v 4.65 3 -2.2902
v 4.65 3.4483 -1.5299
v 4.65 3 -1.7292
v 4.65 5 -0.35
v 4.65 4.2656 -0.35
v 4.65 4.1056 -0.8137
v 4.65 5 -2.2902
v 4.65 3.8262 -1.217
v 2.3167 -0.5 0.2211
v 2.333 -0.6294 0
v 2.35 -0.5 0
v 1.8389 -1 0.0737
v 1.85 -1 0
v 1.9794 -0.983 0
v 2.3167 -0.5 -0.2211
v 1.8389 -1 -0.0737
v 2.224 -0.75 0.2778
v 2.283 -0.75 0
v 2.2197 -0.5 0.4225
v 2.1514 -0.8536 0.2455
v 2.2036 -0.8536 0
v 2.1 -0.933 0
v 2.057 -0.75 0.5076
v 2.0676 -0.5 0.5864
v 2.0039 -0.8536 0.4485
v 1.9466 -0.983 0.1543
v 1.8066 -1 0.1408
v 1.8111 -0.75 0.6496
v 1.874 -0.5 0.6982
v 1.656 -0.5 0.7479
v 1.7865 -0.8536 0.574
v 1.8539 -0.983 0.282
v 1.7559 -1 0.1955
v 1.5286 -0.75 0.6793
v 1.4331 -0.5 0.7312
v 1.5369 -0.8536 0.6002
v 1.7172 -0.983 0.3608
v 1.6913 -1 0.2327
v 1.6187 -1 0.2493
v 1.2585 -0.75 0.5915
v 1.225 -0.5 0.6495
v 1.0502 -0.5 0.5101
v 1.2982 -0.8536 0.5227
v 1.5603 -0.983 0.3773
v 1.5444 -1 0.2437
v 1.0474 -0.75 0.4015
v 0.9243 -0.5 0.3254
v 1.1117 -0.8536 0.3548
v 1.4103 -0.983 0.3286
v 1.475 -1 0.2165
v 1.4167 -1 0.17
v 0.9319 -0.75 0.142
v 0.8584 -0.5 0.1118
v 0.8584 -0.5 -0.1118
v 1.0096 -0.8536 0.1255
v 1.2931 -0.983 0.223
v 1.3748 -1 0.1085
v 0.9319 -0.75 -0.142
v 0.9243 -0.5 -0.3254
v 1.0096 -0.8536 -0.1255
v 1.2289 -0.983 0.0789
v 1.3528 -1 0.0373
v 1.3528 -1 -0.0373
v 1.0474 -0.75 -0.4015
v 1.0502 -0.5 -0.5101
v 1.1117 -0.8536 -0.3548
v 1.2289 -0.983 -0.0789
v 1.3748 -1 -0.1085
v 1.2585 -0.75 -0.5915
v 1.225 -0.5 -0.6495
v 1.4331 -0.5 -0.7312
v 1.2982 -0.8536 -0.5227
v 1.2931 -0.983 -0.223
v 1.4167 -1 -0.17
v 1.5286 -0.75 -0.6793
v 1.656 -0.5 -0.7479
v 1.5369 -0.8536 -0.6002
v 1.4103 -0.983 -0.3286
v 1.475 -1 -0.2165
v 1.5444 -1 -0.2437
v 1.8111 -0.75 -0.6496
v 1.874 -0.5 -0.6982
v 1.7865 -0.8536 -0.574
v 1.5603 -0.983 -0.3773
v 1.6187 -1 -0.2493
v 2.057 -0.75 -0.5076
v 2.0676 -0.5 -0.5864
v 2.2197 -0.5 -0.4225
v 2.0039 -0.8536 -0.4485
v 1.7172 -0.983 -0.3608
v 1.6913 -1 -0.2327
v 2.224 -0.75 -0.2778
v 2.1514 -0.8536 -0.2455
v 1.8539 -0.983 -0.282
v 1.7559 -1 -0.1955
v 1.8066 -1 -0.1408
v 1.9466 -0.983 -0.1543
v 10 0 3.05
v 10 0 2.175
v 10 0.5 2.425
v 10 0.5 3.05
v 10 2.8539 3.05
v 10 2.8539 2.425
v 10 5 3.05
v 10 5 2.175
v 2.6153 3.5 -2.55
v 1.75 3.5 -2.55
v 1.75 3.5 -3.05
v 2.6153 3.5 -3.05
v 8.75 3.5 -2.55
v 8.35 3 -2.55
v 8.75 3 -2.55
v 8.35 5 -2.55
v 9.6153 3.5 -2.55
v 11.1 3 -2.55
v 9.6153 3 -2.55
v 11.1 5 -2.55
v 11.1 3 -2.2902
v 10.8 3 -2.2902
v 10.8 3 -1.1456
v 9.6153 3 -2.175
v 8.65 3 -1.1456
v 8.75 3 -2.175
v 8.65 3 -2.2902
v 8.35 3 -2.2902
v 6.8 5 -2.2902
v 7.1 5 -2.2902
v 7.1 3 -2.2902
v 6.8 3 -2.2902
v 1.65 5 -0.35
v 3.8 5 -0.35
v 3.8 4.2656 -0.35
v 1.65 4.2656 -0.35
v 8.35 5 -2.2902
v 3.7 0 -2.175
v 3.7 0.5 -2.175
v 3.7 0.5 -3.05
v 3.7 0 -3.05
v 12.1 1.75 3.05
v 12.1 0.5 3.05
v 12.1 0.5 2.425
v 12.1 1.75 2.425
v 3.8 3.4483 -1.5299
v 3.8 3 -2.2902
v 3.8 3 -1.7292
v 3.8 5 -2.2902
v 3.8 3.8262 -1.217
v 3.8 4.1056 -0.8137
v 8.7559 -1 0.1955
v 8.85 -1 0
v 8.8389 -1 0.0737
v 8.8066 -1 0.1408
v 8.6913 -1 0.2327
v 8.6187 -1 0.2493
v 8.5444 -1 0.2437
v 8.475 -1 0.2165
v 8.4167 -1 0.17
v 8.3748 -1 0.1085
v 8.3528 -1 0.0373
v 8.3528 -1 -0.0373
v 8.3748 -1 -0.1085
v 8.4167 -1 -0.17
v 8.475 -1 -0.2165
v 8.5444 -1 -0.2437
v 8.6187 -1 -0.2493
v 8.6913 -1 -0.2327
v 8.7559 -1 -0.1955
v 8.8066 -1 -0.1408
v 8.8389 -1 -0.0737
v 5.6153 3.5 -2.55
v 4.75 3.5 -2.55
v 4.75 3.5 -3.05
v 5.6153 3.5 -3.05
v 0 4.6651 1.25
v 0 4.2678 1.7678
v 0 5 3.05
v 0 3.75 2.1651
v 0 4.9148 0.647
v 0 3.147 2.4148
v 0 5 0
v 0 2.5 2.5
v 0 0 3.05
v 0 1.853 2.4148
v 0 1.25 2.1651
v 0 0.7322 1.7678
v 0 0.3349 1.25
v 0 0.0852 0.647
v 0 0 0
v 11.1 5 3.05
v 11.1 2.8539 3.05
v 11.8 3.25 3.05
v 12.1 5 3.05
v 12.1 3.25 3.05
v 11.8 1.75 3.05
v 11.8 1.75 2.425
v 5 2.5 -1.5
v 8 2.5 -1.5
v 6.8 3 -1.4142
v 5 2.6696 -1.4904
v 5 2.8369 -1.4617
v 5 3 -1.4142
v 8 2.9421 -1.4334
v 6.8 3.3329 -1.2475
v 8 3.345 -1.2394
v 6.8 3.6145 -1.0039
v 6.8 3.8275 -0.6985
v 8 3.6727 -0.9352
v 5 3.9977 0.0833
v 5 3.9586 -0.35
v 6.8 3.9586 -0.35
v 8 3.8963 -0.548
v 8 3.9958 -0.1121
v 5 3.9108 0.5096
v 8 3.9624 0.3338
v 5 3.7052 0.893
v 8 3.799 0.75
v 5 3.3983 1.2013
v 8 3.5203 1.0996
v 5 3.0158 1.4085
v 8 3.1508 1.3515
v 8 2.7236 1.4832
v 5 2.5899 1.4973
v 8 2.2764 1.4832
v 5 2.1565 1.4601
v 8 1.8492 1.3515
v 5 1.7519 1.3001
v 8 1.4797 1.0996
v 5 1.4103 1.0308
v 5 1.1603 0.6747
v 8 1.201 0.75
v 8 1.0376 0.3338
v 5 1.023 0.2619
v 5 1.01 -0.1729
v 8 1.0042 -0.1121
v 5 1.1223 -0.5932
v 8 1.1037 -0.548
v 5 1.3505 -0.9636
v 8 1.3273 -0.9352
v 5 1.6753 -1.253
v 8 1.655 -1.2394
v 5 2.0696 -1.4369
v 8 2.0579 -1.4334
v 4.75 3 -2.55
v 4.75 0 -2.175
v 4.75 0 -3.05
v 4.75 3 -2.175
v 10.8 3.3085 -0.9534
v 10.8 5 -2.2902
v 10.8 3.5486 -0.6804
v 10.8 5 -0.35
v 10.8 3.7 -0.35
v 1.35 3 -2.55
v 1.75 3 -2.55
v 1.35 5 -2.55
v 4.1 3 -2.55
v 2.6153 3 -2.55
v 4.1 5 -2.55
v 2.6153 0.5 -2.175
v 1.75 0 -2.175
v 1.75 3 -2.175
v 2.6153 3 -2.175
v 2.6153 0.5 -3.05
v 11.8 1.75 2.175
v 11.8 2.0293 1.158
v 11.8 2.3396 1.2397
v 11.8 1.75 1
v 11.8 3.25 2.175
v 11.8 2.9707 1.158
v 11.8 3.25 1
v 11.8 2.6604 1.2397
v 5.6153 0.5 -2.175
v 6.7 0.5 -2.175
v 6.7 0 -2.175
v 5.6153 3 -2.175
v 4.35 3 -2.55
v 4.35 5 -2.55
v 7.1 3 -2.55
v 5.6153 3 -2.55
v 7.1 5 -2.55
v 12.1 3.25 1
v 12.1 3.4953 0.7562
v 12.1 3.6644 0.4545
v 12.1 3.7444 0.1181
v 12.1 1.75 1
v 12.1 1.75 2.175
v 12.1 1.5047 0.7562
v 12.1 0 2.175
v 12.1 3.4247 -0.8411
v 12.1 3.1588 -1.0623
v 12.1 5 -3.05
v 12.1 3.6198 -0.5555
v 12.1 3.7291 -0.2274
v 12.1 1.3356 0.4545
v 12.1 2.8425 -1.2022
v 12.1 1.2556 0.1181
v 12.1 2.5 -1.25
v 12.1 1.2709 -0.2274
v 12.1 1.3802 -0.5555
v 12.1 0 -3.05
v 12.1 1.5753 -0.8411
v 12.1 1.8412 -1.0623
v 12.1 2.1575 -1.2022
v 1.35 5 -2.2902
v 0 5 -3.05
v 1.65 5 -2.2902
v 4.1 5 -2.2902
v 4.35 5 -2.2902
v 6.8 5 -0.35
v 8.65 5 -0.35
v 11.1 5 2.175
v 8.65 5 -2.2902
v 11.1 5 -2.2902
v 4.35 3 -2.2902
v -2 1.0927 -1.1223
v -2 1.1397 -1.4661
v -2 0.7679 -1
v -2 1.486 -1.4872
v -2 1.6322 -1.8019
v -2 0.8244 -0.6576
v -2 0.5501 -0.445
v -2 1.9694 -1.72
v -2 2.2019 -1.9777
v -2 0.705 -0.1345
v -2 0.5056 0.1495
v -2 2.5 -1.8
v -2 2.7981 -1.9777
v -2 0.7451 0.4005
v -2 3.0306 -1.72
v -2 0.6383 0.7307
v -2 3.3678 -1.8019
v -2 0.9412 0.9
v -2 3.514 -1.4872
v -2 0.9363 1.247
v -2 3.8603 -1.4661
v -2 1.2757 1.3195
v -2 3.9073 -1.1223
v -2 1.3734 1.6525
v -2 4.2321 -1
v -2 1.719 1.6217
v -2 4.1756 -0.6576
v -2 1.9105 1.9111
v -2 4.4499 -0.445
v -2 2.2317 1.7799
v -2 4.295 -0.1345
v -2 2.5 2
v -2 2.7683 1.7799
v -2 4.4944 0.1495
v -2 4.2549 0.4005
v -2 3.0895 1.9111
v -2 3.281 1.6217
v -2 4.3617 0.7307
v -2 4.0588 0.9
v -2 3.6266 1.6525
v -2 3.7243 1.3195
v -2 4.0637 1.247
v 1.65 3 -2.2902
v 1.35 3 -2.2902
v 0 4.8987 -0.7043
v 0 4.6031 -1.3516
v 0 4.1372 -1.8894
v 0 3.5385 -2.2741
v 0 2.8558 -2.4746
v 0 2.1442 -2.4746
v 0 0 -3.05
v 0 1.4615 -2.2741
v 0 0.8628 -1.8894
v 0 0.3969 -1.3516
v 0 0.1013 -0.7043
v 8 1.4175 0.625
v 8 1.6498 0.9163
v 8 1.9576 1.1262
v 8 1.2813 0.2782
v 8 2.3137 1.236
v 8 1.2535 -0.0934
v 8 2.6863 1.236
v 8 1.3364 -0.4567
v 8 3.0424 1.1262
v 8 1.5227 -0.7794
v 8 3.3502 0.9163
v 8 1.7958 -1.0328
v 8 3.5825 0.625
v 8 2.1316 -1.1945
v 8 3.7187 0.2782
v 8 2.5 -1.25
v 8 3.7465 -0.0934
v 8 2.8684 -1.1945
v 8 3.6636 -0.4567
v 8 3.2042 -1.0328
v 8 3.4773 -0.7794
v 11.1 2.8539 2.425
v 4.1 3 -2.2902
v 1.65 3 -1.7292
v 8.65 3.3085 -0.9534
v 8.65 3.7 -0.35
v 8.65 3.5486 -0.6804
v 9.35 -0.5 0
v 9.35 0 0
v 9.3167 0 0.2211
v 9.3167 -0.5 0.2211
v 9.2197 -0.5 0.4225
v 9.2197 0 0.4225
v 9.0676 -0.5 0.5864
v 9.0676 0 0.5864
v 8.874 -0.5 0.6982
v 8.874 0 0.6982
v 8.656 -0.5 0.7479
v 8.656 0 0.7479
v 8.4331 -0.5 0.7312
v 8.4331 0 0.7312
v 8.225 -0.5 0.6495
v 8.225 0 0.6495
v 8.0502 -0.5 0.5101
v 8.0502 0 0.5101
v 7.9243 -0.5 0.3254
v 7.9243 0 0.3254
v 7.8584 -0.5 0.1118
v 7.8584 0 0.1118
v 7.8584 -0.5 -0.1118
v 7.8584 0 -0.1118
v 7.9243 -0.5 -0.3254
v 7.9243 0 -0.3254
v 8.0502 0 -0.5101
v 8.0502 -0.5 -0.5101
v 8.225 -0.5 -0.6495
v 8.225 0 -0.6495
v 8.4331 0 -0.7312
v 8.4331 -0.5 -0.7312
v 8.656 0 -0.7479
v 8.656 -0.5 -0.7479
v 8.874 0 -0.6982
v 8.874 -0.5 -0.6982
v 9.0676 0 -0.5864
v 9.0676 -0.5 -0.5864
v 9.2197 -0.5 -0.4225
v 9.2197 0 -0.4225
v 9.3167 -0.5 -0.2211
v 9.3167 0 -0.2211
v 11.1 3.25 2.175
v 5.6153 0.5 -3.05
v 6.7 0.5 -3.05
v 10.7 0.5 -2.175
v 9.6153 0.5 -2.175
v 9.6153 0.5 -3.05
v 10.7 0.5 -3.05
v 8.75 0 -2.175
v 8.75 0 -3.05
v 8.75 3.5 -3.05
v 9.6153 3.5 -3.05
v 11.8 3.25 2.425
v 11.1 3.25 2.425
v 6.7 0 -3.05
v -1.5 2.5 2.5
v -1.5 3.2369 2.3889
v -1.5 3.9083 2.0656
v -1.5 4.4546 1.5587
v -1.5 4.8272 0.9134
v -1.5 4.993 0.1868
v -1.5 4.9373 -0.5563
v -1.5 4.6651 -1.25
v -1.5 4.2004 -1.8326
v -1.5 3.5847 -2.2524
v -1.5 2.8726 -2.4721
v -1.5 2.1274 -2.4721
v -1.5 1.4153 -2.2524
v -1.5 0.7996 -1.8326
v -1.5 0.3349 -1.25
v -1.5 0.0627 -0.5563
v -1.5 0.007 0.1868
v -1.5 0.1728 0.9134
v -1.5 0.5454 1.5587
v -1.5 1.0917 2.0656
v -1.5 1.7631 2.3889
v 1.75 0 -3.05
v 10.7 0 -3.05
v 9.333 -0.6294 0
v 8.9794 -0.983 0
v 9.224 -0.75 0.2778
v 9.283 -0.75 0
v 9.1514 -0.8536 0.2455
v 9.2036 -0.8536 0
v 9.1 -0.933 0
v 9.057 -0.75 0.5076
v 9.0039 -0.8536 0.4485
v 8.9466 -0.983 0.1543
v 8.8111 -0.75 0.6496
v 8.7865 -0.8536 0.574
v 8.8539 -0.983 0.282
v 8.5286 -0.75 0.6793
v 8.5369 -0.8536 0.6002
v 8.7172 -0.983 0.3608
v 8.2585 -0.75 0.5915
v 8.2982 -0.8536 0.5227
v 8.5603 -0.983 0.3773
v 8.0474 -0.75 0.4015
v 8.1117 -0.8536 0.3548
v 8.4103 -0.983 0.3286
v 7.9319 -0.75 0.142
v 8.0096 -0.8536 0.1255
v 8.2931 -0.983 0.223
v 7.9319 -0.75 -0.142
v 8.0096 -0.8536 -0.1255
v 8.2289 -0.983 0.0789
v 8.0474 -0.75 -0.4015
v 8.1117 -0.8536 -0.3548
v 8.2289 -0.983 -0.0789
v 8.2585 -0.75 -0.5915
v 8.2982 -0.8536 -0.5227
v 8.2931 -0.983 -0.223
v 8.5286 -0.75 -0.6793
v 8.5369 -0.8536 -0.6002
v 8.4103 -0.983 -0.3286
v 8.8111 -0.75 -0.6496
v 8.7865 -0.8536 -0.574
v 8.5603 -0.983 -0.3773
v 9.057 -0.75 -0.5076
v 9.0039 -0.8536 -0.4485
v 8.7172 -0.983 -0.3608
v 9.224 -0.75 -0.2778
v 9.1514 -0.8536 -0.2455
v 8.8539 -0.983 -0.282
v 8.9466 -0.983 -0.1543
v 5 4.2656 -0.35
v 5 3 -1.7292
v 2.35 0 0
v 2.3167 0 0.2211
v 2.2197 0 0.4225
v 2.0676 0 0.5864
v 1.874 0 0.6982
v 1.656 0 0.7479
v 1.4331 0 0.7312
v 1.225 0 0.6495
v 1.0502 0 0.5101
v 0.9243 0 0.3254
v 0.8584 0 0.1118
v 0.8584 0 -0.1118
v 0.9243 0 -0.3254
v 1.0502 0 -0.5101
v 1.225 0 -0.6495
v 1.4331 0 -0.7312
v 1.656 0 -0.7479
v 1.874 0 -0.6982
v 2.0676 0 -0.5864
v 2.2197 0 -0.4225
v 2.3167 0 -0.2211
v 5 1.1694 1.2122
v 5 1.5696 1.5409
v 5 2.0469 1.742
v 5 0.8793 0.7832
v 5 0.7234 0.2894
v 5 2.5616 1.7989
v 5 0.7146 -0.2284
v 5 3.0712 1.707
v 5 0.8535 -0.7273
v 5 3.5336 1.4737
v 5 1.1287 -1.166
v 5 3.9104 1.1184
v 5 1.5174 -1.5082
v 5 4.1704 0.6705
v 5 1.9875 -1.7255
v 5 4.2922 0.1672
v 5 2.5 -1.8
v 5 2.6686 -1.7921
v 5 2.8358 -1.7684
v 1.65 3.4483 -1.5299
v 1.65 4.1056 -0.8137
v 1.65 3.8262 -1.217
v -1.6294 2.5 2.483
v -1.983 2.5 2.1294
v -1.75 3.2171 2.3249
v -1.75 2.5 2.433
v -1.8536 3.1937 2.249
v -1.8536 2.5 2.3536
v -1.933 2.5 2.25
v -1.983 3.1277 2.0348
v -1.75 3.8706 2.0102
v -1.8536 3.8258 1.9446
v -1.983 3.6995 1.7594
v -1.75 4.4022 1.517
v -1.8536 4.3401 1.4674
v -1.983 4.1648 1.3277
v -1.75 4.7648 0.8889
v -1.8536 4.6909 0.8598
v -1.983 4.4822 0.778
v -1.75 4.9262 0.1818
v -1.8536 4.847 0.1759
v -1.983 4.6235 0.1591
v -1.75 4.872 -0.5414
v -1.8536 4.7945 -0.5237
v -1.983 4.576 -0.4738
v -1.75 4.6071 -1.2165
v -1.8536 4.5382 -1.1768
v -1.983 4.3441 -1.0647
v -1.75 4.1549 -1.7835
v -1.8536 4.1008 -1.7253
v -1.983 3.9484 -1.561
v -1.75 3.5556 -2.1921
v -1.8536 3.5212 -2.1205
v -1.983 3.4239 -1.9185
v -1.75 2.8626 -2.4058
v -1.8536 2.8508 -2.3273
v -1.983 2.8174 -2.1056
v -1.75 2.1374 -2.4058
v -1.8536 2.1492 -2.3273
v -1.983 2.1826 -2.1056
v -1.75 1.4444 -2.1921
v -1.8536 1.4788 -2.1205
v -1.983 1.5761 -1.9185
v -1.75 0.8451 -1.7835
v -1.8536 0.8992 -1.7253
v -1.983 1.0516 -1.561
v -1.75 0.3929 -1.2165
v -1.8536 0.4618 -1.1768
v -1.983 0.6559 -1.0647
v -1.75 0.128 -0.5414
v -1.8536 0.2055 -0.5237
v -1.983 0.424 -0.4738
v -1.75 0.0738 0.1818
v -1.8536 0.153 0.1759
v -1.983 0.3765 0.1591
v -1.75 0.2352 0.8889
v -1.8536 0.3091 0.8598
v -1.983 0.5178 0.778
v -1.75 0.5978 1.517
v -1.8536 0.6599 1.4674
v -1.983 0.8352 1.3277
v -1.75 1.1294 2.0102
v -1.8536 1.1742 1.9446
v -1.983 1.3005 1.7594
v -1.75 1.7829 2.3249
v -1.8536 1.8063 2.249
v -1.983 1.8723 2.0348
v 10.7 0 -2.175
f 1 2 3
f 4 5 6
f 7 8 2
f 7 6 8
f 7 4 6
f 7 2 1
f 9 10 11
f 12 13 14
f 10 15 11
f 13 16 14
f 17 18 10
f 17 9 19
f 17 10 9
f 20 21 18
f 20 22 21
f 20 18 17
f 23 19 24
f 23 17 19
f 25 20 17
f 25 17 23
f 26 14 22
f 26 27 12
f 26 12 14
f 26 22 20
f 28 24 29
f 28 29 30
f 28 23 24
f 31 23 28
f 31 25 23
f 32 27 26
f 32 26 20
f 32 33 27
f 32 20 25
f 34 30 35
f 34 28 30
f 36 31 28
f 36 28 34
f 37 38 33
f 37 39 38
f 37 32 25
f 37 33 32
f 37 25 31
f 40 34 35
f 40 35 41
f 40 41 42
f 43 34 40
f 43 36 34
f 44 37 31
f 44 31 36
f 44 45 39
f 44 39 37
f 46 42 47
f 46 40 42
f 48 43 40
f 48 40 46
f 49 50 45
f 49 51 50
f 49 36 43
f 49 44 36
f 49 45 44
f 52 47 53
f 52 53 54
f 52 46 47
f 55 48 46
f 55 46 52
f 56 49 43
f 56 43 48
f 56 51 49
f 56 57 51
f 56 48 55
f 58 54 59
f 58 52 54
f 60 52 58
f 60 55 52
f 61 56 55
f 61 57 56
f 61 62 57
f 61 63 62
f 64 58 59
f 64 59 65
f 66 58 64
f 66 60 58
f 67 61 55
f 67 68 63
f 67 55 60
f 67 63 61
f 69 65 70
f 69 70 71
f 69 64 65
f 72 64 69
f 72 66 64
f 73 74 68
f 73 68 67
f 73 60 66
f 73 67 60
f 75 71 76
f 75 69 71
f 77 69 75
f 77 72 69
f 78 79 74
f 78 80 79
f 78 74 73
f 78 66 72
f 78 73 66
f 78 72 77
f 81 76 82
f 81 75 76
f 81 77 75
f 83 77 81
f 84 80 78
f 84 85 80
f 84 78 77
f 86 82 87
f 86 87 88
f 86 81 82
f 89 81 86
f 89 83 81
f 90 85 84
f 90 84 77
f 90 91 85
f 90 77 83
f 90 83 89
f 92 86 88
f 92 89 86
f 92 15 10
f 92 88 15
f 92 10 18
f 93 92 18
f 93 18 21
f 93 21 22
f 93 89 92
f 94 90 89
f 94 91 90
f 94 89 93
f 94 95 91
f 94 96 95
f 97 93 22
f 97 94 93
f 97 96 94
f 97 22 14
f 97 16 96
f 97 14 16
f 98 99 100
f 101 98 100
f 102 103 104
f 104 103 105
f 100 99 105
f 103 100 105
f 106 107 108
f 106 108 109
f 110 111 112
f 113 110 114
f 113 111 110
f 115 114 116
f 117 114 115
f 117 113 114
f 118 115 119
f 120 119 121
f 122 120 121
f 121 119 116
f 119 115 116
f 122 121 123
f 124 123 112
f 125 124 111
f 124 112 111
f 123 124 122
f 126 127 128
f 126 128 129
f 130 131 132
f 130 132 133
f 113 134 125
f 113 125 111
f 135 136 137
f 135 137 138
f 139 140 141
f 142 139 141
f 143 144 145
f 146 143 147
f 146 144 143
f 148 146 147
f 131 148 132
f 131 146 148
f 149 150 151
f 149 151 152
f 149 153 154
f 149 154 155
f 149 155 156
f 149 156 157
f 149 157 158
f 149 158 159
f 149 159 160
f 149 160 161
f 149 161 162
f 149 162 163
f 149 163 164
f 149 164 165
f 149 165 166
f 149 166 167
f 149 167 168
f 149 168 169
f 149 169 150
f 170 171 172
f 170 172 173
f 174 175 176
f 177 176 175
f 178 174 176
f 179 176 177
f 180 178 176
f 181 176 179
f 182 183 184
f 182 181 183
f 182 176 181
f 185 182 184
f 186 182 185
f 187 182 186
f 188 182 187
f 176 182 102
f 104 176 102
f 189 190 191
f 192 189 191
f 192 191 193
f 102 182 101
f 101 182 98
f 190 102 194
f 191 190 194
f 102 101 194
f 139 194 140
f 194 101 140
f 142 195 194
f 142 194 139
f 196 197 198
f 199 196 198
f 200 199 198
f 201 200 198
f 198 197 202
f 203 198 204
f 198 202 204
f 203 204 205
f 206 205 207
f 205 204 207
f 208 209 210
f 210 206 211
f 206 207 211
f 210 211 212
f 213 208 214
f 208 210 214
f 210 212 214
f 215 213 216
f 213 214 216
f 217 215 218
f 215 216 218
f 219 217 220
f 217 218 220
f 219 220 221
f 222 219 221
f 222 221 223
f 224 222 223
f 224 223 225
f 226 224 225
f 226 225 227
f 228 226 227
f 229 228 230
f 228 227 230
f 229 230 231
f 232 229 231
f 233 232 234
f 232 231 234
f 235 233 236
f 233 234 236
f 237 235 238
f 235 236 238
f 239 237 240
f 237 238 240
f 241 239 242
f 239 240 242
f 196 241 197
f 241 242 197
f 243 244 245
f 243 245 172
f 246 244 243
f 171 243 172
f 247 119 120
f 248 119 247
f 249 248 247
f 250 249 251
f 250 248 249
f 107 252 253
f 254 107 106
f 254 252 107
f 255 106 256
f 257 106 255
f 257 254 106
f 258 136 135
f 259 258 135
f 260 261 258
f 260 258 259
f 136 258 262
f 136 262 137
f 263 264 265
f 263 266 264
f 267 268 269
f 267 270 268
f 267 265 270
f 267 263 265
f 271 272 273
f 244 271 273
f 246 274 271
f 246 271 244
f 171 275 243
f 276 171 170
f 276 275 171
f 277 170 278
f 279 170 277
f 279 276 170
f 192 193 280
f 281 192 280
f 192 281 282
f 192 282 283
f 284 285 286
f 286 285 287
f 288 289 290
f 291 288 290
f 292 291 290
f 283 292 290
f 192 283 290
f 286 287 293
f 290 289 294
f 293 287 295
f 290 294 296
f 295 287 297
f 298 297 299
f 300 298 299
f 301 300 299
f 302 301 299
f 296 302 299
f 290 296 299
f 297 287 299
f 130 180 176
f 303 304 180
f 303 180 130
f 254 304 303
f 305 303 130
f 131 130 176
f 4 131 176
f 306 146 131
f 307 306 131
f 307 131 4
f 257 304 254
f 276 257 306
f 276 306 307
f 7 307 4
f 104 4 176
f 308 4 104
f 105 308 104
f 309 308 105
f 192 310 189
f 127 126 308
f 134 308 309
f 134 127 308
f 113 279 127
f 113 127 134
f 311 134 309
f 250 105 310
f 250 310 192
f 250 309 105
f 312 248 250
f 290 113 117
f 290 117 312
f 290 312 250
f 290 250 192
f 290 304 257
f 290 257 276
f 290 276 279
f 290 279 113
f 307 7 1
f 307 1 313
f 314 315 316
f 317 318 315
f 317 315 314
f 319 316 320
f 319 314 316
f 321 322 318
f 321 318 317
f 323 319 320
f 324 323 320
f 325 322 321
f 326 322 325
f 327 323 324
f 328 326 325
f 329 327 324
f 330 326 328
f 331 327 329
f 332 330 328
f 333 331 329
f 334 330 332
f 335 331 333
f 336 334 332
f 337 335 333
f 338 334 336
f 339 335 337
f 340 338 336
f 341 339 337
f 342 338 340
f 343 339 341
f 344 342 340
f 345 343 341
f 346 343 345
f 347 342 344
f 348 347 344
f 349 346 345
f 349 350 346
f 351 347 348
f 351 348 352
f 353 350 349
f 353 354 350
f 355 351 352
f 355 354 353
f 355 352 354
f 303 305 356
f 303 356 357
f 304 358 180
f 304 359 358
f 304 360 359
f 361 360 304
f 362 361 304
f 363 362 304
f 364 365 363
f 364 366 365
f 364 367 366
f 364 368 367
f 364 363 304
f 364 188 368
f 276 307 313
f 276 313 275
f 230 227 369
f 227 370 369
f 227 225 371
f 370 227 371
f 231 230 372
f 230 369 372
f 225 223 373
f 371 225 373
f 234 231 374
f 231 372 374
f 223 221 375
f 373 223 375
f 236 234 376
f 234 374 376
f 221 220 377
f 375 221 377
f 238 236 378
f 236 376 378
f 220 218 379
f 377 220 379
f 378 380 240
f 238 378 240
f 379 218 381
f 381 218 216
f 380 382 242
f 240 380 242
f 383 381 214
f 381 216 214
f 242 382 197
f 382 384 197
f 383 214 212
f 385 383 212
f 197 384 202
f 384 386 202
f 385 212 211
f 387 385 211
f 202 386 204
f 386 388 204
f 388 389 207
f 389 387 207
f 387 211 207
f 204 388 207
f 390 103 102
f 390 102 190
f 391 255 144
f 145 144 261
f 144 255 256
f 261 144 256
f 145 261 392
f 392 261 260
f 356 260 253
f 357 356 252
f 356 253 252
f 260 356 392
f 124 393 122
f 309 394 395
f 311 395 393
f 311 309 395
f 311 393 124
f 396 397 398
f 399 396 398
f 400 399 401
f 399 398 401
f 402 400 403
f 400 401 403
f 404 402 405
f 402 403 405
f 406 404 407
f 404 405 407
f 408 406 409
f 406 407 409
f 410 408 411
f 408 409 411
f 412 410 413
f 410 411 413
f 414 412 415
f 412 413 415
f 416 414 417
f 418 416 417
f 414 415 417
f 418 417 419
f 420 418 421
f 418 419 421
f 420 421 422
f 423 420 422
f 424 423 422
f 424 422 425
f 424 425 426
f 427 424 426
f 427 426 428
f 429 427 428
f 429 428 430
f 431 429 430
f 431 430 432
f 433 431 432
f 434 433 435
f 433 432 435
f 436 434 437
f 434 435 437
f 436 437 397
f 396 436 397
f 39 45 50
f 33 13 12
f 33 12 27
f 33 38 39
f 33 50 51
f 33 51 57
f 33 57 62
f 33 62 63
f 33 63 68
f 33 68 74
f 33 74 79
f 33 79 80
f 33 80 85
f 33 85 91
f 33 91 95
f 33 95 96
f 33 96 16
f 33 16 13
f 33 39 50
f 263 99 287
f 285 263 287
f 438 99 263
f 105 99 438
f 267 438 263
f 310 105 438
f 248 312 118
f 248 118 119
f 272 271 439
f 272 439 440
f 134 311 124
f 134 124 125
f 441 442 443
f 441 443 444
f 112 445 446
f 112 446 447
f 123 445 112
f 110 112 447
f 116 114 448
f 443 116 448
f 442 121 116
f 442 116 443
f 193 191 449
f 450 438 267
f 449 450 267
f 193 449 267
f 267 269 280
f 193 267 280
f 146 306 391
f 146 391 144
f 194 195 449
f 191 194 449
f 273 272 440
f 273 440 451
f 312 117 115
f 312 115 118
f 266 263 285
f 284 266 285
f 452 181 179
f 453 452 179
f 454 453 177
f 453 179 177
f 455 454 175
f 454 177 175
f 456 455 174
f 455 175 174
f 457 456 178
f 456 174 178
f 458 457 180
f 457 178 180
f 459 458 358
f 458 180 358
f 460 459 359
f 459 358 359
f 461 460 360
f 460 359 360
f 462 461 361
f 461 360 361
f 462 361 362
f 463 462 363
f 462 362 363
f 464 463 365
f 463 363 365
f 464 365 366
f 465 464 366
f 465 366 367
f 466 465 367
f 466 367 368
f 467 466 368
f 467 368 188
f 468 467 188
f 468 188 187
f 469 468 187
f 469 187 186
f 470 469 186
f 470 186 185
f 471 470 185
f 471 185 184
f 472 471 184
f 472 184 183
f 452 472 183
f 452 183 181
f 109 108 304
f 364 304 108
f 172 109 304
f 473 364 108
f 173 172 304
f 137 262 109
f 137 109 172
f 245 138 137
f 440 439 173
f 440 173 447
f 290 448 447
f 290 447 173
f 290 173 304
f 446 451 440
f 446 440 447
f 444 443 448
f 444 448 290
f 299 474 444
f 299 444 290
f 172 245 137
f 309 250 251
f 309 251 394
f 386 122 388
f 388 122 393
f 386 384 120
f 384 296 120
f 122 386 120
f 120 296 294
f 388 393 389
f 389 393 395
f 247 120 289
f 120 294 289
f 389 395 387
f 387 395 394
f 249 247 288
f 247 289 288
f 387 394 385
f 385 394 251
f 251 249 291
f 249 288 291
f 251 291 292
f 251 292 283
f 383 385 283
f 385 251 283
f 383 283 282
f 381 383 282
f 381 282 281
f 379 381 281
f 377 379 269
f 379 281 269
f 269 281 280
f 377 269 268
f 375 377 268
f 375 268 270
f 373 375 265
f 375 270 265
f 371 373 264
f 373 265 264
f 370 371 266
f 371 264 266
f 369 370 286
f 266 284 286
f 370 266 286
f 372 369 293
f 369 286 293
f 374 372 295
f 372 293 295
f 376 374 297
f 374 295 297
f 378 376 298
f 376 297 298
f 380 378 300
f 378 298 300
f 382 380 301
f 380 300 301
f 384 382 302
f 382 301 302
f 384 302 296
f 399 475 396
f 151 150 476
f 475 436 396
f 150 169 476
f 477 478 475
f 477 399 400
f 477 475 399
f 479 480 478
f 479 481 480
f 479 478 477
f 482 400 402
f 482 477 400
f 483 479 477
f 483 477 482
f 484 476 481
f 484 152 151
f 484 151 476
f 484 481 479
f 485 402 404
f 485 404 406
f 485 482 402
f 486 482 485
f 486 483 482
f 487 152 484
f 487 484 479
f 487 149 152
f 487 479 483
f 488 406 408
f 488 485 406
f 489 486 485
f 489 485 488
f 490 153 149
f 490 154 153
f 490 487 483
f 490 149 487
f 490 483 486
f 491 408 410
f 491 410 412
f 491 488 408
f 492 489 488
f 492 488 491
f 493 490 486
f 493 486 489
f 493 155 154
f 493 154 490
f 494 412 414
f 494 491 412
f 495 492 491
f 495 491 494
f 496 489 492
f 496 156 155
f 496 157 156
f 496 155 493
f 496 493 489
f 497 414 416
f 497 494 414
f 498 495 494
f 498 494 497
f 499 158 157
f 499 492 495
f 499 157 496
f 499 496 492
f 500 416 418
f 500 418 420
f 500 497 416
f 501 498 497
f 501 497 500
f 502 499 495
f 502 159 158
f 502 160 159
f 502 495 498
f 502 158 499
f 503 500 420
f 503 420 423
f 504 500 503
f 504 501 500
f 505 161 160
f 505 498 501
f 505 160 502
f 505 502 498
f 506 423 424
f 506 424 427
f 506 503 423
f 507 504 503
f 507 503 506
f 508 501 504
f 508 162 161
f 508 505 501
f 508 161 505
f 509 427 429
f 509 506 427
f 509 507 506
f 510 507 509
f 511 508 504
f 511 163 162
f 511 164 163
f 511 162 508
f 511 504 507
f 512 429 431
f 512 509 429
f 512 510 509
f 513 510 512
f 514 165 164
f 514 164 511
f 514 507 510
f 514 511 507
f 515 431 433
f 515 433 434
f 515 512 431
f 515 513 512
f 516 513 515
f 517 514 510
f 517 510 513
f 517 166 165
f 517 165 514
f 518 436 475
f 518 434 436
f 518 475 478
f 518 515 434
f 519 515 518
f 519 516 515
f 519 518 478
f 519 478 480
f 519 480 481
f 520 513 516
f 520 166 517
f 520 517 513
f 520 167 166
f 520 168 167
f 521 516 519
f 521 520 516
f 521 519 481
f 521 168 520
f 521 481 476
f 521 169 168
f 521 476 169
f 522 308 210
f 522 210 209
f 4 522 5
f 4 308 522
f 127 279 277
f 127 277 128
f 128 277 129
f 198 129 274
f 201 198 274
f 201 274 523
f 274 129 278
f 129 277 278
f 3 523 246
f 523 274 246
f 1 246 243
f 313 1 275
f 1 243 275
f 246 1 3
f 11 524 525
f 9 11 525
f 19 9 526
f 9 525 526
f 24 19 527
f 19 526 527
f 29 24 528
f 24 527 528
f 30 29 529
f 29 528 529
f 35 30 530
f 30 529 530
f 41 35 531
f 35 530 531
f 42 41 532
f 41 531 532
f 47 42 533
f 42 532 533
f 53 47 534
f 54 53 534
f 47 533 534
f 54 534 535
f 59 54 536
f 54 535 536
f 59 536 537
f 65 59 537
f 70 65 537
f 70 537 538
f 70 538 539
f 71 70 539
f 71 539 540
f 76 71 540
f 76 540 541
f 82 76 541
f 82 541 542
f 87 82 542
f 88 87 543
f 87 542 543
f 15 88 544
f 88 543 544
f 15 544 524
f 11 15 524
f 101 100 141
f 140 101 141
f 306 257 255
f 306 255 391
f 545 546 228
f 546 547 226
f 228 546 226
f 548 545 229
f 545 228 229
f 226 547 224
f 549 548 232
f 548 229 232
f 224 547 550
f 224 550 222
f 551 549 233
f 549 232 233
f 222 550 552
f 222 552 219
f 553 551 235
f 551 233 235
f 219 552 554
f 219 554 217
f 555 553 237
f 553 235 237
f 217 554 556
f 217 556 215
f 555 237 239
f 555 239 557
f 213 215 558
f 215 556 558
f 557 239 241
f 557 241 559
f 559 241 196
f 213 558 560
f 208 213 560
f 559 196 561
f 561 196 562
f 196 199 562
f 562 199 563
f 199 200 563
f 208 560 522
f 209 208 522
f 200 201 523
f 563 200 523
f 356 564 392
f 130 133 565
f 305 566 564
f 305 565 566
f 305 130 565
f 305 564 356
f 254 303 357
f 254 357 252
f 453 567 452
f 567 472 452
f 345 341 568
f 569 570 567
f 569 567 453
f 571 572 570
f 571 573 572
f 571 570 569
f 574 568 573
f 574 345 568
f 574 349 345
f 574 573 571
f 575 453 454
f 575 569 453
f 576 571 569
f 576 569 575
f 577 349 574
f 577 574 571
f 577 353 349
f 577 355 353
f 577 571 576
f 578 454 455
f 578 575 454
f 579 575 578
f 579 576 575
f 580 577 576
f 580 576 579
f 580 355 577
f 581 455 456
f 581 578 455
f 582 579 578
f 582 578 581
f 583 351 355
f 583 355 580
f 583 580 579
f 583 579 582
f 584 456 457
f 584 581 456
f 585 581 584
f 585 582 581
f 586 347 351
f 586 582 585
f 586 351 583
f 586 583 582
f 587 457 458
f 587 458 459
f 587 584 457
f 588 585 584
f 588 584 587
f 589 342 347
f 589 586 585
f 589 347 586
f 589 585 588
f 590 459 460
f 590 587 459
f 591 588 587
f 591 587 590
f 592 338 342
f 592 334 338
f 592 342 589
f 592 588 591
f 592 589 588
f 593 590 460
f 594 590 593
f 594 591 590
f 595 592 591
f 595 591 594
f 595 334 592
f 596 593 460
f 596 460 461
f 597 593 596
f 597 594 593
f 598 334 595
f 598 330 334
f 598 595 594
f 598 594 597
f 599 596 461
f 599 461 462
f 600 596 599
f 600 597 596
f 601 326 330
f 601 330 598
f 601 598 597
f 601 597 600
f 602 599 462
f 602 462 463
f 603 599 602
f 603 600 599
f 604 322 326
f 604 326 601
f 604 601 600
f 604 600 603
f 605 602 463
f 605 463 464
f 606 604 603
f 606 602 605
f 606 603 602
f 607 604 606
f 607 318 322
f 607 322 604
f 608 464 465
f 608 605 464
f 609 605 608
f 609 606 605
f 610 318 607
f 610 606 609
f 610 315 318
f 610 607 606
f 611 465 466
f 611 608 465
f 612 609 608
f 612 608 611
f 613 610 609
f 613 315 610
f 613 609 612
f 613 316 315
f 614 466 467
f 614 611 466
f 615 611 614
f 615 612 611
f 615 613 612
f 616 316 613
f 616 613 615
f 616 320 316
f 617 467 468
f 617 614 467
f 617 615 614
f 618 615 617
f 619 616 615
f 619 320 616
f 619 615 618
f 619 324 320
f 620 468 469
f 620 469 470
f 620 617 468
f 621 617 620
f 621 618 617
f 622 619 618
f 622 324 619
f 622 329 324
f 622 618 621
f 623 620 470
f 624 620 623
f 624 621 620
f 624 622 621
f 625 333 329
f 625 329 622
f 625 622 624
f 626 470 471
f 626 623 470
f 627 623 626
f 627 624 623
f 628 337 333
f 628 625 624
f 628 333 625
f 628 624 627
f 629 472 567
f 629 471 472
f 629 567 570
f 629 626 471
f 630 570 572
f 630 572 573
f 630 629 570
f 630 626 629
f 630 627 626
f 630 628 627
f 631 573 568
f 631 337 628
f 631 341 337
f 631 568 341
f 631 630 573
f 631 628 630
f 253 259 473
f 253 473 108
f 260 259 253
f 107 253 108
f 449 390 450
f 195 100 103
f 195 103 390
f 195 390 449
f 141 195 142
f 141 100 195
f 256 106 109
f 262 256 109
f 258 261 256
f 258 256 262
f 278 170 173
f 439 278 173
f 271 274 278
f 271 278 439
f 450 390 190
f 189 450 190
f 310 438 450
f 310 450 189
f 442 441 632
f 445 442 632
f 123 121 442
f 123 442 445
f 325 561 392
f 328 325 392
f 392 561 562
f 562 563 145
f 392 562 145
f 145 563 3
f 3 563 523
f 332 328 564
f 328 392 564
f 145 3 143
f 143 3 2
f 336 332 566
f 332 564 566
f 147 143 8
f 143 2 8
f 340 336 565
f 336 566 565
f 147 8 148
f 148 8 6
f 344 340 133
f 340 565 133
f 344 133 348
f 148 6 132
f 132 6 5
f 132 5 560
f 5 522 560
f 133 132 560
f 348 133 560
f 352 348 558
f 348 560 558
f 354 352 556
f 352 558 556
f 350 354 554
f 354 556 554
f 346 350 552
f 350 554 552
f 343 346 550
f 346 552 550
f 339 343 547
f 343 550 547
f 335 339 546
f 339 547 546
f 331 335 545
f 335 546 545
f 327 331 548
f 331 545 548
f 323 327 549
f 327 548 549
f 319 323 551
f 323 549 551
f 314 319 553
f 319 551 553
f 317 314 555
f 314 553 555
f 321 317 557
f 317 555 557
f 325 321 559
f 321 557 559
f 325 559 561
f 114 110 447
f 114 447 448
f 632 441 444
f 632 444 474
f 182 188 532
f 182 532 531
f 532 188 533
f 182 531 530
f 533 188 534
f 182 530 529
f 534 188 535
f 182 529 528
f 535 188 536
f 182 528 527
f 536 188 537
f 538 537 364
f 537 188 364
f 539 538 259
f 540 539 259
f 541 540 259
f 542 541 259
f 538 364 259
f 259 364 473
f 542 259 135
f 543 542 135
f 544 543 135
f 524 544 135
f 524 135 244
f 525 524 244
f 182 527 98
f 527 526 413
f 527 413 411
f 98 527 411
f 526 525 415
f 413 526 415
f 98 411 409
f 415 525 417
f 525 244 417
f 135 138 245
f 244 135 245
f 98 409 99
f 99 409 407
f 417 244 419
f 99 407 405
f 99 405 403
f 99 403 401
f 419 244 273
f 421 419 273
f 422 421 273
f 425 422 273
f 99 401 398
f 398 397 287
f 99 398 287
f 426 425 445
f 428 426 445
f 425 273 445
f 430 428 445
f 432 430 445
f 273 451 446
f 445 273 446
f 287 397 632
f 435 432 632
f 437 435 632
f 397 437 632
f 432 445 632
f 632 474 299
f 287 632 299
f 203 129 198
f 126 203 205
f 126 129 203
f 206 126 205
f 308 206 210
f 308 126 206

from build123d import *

# Parameters (mm, degrees)
SKETCH_1_W          = 12.1
SKETCH_1_H          = 6.1
EXTRUDE_1_DEPTH     = 5
SKETCH_3_R          = 2.5
EXTRUDE_2_DEPTH     = 2
SKETCH_4_R          = 0.75
EXTRUDE_3_DEPTH     = 1
FILLET_1_R          = 0.5
CUT_EXTRUDE_START   = -0.875
CUT_EXTRUDE_2_DEPTH = 0.875
CUT_EXTRUDE_4_DEPTH = 2
FILLET_2_R          = 0.5
SKETCH_10_W         = 1.1
SKETCH_10_H         = 2.146086497
SKETCH_10_W_2       = 2.1
SKETCH_10_H_2       = 0.5
SKETCH_10_W_3       = 0.3
SKETCH_10_H_3       = 1.5
CUT_EXTRUDE_5_DEPTH = 0.875
SKETCH_11_W         = 2.1
SKETCH_11_H         = 0.25
CUT_EXTRUDE_6_DEPTH = 3.25
SKETCH_12_W         = 0.3
SKETCH_12_H         = 1.5
CUT_EXTRUDE_7_DEPTH = 3


with BuildPart() as part:
    # 草图1 → 凸台-拉伸1 (new body)
    with BuildSketch(Plane(origin=(0, 0, 0), x_dir=(1, 0, 0), z_dir=(0, 1, 0))):
        with Locations((6.05, 0)):
            Rectangle(SKETCH_1_W, SKETCH_1_H)
    extrude(amount=EXTRUDE_1_DEPTH)

    # 草图3 → 凸台-拉伸2 (add)
    with BuildSketch(Plane.ZY):
        with Locations((0, 2.5)):
            Circle(SKETCH_3_R)
    extrude(amount=EXTRUDE_2_DEPTH)

    # 草图4 → 凸台-拉伸3 (add)
    with BuildSketch(Plane.XZ):
        with Locations((1.6, 0)):
            Circle(SKETCH_4_R)
        with Locations((8.6, 0)):
            Circle(SKETCH_4_R)
    extrude(amount=EXTRUDE_3_DEPTH)

    # 圆角1
    fillet_1_edges = [part.edges().sort_by_distance(p)[0] for p in [
        (0.85, -1, 0),
        (7.85, -1, 0),
    ]]
    fillet(fillet_1_edges, radius=FILLET_1_R)

    # 草图6 → 切除-拉伸2 (cut)
    with BuildSketch(Plane(origin=(0, 0, -3.05), x_dir=(-1, 0, 0), z_dir=(0, 0, -1)).offset(CUT_EXTRUDE_START)):
        Polygon((-1.75, 0), (-1.75, 3.5), (-2.615259451, 3.5), (-2.615259451, 0.5), (-3.7, 0.5), (-3.7, 0), align=None)
        Polygon((-6.7, 0.5), (-6.7, 0), (-4.75, 0), (-4.75, 3.5), (-5.615259451, 3.5), (-5.615259451, 0.5), align=None)
        Polygon((-8.75, 3.5), (-9.615259451, 3.5), (-9.615259451, 0.5), (-10.7, 0.5), (-10.7, 0), (-8.75, 0), align=None)
    extrude(amount=CUT_EXTRUDE_2_DEPTH, mode=Mode.SUBTRACT)

    # 草图8 → 切除-拉伸4 (cut)
    with BuildSketch(Plane(origin=(0, 5, 0), x_dir=(1, 0, 0), z_dir=(0, 1, 0))):
        Polygon((8.35, 2.55), (11.1, 2.55), (11.1, 2.290157714), (10.8, 2.290157714), (10.8, 0.35), (8.65, 0.35), (8.65, 2.290157714), (8.35, 2.290157714), align=None)
        Polygon((4.35, 2.55), (7.1, 2.55), (7.1, 2.290157714), (6.8, 2.290157714), (6.8, 0.35), (4.65, 0.35), (4.65, 2.290157714), (4.35, 2.290157714), align=None)
        Polygon((1.35, 2.55), (4.1, 2.55), (4.1, 2.290157714), (3.8, 2.290157714), (3.8, 0.35), (1.65, 0.35), (1.65, 2.290157714), (1.35, 2.290157714), align=None)
    extrude(amount=-CUT_EXTRUDE_4_DEPTH, mode=Mode.SUBTRACT)

    # 草图9 → 切除-旋转1 (revolve, cut)
    with BuildSketch(Plane(origin=(0, 2.5, 0), x_dir=(1, 0, 0), z_dir=(0, 1, 0))):
        Polygon((-2, 0), (-2, 1.8), (5, 1.8), (5, 1.5), (8, 1.5), (8, 1.25), (12.1, 1.25), (12.1, 0), align=None)
    revolve(axis=Axis((-0.907835796, 2.5, 0), (1, 0, 0)), mode=Mode.SUBTRACT)

    # 圆角2
    fillet_2_edges = [part.edges().sort_by_distance(p)[0] for p in [
        (-2, 2.5, -2.5),
    ]]
    fillet(fillet_2_edges, radius=FILLET_2_R)

    # 草图10 → 切除-拉伸5 (cut)
    with BuildSketch(Plane.XY.offset(3.05).offset(CUT_EXTRUDE_START)):
        with Locations((10.55, 3.926956752)):
            Rectangle(SKETCH_10_W, SKETCH_10_H)
        with Locations((11.05, 0.25)):
            Rectangle(SKETCH_10_W_2, SKETCH_10_H_2)
        with Locations((11.95, 2.5)):
            Rectangle(SKETCH_10_W_3, SKETCH_10_H_3)
    extrude(amount=CUT_EXTRUDE_5_DEPTH, mode=Mode.SUBTRACT)

    # 草图11 → 切除-拉伸6 (cut)
    with BuildSketch(Plane.XZ):
        with Locations((11.05, 2.3)):
            Rectangle(SKETCH_11_W, SKETCH_11_H)
    extrude(amount=-CUT_EXTRUDE_6_DEPTH, mode=Mode.SUBTRACT)

    # 草图12 → 切除-拉伸7 (cut)
    with BuildSketch(Plane.XY.offset(3.05)):
        with Locations((11.95, 2.5)):
            Rectangle(SKETCH_12_W, SKETCH_12_H)
    extrude(amount=-CUT_EXTRUDE_7_DEPTH, mode=Mode.SUBTRACT)


solid = part.part
